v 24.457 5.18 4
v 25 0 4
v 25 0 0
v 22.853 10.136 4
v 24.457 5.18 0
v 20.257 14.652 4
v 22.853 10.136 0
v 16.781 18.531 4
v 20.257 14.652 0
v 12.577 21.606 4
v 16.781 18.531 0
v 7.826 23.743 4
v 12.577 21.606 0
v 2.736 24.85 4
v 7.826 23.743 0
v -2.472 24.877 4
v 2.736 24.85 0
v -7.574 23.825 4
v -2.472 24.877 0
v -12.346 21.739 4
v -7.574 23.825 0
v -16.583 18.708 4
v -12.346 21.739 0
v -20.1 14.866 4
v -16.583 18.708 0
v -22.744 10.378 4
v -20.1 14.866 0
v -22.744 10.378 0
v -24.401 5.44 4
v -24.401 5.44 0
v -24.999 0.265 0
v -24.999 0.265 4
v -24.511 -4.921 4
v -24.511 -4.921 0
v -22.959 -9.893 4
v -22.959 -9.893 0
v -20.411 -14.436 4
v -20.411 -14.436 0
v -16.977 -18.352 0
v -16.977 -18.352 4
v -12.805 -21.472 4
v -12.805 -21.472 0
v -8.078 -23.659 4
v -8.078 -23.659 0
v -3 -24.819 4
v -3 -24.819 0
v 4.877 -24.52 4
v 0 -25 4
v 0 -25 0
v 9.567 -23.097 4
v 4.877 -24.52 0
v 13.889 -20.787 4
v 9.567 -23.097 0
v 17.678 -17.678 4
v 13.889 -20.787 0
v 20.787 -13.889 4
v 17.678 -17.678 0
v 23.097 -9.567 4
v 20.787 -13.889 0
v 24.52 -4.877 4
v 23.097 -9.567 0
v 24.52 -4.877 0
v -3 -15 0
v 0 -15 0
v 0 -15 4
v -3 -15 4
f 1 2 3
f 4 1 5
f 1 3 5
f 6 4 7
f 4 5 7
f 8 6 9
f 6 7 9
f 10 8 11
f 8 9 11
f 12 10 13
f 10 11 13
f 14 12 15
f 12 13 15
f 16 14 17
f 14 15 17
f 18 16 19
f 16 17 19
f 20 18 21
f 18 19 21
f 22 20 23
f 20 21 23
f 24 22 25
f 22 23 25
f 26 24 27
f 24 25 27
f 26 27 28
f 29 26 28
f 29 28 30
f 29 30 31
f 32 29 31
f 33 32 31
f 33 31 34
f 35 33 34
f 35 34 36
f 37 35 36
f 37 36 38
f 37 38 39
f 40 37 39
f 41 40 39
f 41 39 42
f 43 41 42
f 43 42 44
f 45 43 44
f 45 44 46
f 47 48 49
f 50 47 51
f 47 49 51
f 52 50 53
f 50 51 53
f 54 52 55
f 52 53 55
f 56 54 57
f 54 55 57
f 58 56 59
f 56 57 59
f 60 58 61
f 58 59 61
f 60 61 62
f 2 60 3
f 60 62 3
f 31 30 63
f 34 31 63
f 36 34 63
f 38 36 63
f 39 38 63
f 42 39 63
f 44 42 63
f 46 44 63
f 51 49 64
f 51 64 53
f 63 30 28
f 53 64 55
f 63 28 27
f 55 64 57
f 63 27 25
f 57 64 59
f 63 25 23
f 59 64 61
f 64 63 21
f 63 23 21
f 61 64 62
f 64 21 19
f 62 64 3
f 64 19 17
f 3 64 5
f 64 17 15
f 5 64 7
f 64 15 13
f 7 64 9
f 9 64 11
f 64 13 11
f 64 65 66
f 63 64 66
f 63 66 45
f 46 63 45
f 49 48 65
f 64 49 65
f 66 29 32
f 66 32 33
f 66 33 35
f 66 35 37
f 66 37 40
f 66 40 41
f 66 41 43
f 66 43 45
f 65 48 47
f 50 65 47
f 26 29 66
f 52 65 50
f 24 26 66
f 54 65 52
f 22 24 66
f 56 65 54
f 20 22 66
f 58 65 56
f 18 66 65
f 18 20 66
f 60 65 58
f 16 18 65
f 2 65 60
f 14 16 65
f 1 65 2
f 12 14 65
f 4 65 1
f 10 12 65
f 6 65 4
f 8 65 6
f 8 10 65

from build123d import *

# Parameters (mm, degrees)
F0_R     = 25
F1_DEPTH = 4
F3_DEPTH = 73


# Not quite as in the source:
# - an extrude ends at something that could not be found from the text; its depth is read off the source's solid


with BuildPart() as f1:
    # F0 (on Top) → F1 (new body)
    with BuildSketch(Plane.XY):
        Circle(F0_R)
    extrude(amount=F1_DEPTH)

    # F2 (on face) → F3 (cut, through all)
    with BuildSketch(Plane.XY.offset(4)):
        with BuildLine():
            Line((-3, -25), (0, -25))
            ThreePointArc((0, -25), (-1.5027171558, -24.9547959549), (-3, -24.819347292))
            Line((-3, -24.819347292), (-3, -25))
        make_face()
        with BuildLine():
            Line((0, -25), (0, -15))
            Line((0, -15), (-3, -15))
            Line((-3, -15), (-3, -24.819347292))
            ThreePointArc((-3, -24.819347292), (-1.5027171558, -24.9547959549), (0, -25))
        make_face()
    extrude(amount=-F3_DEPTH, mode=Mode.SUBTRACT)


solid = f1.part
